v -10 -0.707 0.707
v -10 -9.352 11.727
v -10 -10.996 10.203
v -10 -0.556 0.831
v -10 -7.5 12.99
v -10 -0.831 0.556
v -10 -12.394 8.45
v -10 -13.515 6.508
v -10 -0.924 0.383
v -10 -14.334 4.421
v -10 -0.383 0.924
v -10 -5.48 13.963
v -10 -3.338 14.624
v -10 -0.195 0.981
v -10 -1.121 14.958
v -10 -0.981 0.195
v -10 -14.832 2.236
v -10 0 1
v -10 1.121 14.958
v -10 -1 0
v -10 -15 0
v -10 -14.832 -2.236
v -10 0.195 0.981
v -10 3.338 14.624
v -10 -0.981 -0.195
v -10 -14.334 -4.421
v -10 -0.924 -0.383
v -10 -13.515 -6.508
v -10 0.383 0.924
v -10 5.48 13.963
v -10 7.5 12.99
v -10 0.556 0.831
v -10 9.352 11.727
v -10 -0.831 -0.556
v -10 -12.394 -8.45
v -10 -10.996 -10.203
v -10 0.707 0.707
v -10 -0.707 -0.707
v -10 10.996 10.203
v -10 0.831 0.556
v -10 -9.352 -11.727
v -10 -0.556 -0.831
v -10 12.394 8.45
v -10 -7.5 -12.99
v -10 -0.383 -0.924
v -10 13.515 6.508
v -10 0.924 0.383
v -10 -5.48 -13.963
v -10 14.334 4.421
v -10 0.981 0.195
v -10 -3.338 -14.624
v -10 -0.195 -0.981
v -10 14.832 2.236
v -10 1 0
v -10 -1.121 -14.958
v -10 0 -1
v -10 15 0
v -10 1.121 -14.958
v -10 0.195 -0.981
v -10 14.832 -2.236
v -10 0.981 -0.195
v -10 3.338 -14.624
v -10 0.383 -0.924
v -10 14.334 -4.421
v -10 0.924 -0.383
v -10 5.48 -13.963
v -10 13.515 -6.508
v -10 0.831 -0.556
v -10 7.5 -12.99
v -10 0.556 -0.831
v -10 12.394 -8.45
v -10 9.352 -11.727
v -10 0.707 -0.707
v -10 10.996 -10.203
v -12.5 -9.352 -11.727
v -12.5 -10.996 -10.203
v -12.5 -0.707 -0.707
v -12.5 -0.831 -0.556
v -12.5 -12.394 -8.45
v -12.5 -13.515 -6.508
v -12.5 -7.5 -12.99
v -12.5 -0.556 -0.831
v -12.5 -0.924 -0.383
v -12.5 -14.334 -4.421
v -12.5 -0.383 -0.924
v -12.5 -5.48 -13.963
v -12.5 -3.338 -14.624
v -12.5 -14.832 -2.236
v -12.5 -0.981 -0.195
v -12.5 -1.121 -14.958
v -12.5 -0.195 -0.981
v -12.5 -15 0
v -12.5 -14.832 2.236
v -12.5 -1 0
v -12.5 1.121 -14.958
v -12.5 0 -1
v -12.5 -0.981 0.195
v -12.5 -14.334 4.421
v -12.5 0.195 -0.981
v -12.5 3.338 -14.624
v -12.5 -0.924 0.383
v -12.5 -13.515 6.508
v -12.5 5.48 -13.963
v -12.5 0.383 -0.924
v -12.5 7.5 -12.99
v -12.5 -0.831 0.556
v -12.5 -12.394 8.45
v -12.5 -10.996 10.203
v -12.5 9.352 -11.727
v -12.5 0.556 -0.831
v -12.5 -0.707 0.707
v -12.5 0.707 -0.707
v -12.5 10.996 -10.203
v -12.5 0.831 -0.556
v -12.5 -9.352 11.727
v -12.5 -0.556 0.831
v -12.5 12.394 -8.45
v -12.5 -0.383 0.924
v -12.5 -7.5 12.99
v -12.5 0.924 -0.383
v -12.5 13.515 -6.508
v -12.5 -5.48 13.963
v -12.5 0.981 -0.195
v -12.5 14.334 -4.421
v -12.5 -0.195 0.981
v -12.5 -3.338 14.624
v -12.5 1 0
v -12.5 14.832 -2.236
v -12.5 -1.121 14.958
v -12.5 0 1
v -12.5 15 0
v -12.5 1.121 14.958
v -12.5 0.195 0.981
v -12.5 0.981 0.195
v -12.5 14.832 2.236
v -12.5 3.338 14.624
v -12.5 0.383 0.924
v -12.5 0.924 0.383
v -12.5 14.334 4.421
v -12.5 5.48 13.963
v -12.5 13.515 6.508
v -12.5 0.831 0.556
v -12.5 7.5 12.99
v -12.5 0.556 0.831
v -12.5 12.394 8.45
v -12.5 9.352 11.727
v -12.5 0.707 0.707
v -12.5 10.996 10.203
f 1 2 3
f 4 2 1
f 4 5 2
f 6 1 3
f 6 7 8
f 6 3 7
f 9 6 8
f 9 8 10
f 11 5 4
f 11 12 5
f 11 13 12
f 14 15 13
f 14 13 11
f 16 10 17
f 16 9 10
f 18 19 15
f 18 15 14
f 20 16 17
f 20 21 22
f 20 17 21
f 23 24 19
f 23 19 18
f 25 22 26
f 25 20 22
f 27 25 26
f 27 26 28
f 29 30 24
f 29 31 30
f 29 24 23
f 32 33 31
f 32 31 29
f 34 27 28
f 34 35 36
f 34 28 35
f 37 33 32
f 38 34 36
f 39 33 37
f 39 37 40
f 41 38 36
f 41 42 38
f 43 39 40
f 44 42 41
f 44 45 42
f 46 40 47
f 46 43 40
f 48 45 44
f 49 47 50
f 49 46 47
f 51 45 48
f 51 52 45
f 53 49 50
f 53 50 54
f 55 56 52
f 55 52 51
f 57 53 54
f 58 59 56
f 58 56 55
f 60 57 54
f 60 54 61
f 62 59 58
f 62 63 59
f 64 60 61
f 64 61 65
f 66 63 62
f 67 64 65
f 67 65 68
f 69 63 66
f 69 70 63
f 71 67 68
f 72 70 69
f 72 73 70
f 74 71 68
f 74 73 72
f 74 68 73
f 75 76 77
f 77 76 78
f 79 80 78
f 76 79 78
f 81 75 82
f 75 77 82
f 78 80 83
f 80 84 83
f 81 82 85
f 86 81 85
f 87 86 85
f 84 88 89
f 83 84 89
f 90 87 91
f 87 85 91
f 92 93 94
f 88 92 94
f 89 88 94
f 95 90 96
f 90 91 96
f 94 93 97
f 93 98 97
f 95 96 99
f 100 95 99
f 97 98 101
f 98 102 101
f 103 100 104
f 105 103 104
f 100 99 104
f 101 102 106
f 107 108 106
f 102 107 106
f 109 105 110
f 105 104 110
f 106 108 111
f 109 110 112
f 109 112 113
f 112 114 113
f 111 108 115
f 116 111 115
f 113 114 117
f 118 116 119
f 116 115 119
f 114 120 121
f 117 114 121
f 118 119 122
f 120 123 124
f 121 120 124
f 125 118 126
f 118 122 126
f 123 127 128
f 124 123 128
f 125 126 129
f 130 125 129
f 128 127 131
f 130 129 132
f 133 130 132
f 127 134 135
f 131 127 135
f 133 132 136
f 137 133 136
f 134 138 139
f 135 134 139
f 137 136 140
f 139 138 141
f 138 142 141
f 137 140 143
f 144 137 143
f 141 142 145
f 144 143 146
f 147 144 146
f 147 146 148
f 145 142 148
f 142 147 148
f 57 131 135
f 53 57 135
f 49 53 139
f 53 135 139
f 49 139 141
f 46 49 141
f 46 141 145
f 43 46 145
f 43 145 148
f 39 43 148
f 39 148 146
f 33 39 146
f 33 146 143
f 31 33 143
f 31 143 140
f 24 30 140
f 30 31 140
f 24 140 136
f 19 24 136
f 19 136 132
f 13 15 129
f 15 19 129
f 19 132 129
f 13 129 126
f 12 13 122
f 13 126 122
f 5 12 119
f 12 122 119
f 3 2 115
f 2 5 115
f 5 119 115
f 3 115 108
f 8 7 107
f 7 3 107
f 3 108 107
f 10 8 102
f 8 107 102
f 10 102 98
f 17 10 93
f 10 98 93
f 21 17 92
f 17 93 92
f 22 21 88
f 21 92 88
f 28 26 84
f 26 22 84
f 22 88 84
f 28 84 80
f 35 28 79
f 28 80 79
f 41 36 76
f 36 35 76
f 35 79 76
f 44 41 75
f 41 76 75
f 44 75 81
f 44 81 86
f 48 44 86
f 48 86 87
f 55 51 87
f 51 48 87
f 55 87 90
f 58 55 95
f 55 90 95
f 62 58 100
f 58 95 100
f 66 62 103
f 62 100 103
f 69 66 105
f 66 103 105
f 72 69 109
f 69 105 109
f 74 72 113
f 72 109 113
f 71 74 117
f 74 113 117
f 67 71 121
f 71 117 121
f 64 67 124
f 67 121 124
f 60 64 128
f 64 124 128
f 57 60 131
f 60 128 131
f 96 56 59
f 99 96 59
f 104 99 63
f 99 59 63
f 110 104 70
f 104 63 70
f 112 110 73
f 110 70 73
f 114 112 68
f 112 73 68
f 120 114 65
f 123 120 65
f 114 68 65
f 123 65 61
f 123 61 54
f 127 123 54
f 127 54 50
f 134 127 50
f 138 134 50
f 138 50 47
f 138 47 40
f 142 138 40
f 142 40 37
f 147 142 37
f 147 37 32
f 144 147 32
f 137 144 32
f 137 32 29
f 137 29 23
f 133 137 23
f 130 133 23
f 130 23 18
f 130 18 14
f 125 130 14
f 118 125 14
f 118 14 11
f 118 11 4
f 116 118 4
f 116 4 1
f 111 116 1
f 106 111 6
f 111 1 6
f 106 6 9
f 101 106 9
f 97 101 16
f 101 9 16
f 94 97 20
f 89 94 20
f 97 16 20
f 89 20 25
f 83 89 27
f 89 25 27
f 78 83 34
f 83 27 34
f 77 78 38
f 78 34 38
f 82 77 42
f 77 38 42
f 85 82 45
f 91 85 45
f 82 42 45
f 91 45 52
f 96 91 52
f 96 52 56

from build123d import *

# Parameters (mm, degrees)
SKETCH2_R          = 1
CUT_EXTRUDE1_DEPTH = 26
SKETCH3_R          = 15
CUT_EXTRUDE2_DEPTH = 22.5


with BuildPart() as part:
    # Sketch1 → Revolve1 (revolve)
    with BuildSketch(Plane.XY):
        with BuildLine():
            Line((-12.5, 15), (-12.5, 0))
            Line((-12.5, 0), (12.5, 0))
            Line((12.5, 0), (12.5, 15))
            Line((12.5, 15), (10, 15))
            ThreePointArc((10, 15), (0, 5), (-10, 15))
            Line((-10, 15), (-12.5, 15))
        make_face()
    revolve(axis=Axis((-12.5, 0, 0), (1, 0, 0)))

    # Sketch2 → Cut-Extrude1 (cut, through all)
    with BuildSketch(Plane(origin=(12.5, 0, 0), x_dir=(0, 0, -1), z_dir=(1, 0, 0))):
        Circle(SKETCH2_R)
    extrude(amount=-CUT_EXTRUDE1_DEPTH, mode=Mode.SUBTRACT)

    # Sketch3 → Cut-Extrude2 (cut)
    with BuildSketch(Plane(origin=(12.5, 0, 0), x_dir=(0, 0, -1), z_dir=(1, 0, 0))):
        Circle(SKETCH3_R)
    extrude(amount=-CUT_EXTRUDE2_DEPTH, mode=Mode.SUBTRACT)


solid = part.part
